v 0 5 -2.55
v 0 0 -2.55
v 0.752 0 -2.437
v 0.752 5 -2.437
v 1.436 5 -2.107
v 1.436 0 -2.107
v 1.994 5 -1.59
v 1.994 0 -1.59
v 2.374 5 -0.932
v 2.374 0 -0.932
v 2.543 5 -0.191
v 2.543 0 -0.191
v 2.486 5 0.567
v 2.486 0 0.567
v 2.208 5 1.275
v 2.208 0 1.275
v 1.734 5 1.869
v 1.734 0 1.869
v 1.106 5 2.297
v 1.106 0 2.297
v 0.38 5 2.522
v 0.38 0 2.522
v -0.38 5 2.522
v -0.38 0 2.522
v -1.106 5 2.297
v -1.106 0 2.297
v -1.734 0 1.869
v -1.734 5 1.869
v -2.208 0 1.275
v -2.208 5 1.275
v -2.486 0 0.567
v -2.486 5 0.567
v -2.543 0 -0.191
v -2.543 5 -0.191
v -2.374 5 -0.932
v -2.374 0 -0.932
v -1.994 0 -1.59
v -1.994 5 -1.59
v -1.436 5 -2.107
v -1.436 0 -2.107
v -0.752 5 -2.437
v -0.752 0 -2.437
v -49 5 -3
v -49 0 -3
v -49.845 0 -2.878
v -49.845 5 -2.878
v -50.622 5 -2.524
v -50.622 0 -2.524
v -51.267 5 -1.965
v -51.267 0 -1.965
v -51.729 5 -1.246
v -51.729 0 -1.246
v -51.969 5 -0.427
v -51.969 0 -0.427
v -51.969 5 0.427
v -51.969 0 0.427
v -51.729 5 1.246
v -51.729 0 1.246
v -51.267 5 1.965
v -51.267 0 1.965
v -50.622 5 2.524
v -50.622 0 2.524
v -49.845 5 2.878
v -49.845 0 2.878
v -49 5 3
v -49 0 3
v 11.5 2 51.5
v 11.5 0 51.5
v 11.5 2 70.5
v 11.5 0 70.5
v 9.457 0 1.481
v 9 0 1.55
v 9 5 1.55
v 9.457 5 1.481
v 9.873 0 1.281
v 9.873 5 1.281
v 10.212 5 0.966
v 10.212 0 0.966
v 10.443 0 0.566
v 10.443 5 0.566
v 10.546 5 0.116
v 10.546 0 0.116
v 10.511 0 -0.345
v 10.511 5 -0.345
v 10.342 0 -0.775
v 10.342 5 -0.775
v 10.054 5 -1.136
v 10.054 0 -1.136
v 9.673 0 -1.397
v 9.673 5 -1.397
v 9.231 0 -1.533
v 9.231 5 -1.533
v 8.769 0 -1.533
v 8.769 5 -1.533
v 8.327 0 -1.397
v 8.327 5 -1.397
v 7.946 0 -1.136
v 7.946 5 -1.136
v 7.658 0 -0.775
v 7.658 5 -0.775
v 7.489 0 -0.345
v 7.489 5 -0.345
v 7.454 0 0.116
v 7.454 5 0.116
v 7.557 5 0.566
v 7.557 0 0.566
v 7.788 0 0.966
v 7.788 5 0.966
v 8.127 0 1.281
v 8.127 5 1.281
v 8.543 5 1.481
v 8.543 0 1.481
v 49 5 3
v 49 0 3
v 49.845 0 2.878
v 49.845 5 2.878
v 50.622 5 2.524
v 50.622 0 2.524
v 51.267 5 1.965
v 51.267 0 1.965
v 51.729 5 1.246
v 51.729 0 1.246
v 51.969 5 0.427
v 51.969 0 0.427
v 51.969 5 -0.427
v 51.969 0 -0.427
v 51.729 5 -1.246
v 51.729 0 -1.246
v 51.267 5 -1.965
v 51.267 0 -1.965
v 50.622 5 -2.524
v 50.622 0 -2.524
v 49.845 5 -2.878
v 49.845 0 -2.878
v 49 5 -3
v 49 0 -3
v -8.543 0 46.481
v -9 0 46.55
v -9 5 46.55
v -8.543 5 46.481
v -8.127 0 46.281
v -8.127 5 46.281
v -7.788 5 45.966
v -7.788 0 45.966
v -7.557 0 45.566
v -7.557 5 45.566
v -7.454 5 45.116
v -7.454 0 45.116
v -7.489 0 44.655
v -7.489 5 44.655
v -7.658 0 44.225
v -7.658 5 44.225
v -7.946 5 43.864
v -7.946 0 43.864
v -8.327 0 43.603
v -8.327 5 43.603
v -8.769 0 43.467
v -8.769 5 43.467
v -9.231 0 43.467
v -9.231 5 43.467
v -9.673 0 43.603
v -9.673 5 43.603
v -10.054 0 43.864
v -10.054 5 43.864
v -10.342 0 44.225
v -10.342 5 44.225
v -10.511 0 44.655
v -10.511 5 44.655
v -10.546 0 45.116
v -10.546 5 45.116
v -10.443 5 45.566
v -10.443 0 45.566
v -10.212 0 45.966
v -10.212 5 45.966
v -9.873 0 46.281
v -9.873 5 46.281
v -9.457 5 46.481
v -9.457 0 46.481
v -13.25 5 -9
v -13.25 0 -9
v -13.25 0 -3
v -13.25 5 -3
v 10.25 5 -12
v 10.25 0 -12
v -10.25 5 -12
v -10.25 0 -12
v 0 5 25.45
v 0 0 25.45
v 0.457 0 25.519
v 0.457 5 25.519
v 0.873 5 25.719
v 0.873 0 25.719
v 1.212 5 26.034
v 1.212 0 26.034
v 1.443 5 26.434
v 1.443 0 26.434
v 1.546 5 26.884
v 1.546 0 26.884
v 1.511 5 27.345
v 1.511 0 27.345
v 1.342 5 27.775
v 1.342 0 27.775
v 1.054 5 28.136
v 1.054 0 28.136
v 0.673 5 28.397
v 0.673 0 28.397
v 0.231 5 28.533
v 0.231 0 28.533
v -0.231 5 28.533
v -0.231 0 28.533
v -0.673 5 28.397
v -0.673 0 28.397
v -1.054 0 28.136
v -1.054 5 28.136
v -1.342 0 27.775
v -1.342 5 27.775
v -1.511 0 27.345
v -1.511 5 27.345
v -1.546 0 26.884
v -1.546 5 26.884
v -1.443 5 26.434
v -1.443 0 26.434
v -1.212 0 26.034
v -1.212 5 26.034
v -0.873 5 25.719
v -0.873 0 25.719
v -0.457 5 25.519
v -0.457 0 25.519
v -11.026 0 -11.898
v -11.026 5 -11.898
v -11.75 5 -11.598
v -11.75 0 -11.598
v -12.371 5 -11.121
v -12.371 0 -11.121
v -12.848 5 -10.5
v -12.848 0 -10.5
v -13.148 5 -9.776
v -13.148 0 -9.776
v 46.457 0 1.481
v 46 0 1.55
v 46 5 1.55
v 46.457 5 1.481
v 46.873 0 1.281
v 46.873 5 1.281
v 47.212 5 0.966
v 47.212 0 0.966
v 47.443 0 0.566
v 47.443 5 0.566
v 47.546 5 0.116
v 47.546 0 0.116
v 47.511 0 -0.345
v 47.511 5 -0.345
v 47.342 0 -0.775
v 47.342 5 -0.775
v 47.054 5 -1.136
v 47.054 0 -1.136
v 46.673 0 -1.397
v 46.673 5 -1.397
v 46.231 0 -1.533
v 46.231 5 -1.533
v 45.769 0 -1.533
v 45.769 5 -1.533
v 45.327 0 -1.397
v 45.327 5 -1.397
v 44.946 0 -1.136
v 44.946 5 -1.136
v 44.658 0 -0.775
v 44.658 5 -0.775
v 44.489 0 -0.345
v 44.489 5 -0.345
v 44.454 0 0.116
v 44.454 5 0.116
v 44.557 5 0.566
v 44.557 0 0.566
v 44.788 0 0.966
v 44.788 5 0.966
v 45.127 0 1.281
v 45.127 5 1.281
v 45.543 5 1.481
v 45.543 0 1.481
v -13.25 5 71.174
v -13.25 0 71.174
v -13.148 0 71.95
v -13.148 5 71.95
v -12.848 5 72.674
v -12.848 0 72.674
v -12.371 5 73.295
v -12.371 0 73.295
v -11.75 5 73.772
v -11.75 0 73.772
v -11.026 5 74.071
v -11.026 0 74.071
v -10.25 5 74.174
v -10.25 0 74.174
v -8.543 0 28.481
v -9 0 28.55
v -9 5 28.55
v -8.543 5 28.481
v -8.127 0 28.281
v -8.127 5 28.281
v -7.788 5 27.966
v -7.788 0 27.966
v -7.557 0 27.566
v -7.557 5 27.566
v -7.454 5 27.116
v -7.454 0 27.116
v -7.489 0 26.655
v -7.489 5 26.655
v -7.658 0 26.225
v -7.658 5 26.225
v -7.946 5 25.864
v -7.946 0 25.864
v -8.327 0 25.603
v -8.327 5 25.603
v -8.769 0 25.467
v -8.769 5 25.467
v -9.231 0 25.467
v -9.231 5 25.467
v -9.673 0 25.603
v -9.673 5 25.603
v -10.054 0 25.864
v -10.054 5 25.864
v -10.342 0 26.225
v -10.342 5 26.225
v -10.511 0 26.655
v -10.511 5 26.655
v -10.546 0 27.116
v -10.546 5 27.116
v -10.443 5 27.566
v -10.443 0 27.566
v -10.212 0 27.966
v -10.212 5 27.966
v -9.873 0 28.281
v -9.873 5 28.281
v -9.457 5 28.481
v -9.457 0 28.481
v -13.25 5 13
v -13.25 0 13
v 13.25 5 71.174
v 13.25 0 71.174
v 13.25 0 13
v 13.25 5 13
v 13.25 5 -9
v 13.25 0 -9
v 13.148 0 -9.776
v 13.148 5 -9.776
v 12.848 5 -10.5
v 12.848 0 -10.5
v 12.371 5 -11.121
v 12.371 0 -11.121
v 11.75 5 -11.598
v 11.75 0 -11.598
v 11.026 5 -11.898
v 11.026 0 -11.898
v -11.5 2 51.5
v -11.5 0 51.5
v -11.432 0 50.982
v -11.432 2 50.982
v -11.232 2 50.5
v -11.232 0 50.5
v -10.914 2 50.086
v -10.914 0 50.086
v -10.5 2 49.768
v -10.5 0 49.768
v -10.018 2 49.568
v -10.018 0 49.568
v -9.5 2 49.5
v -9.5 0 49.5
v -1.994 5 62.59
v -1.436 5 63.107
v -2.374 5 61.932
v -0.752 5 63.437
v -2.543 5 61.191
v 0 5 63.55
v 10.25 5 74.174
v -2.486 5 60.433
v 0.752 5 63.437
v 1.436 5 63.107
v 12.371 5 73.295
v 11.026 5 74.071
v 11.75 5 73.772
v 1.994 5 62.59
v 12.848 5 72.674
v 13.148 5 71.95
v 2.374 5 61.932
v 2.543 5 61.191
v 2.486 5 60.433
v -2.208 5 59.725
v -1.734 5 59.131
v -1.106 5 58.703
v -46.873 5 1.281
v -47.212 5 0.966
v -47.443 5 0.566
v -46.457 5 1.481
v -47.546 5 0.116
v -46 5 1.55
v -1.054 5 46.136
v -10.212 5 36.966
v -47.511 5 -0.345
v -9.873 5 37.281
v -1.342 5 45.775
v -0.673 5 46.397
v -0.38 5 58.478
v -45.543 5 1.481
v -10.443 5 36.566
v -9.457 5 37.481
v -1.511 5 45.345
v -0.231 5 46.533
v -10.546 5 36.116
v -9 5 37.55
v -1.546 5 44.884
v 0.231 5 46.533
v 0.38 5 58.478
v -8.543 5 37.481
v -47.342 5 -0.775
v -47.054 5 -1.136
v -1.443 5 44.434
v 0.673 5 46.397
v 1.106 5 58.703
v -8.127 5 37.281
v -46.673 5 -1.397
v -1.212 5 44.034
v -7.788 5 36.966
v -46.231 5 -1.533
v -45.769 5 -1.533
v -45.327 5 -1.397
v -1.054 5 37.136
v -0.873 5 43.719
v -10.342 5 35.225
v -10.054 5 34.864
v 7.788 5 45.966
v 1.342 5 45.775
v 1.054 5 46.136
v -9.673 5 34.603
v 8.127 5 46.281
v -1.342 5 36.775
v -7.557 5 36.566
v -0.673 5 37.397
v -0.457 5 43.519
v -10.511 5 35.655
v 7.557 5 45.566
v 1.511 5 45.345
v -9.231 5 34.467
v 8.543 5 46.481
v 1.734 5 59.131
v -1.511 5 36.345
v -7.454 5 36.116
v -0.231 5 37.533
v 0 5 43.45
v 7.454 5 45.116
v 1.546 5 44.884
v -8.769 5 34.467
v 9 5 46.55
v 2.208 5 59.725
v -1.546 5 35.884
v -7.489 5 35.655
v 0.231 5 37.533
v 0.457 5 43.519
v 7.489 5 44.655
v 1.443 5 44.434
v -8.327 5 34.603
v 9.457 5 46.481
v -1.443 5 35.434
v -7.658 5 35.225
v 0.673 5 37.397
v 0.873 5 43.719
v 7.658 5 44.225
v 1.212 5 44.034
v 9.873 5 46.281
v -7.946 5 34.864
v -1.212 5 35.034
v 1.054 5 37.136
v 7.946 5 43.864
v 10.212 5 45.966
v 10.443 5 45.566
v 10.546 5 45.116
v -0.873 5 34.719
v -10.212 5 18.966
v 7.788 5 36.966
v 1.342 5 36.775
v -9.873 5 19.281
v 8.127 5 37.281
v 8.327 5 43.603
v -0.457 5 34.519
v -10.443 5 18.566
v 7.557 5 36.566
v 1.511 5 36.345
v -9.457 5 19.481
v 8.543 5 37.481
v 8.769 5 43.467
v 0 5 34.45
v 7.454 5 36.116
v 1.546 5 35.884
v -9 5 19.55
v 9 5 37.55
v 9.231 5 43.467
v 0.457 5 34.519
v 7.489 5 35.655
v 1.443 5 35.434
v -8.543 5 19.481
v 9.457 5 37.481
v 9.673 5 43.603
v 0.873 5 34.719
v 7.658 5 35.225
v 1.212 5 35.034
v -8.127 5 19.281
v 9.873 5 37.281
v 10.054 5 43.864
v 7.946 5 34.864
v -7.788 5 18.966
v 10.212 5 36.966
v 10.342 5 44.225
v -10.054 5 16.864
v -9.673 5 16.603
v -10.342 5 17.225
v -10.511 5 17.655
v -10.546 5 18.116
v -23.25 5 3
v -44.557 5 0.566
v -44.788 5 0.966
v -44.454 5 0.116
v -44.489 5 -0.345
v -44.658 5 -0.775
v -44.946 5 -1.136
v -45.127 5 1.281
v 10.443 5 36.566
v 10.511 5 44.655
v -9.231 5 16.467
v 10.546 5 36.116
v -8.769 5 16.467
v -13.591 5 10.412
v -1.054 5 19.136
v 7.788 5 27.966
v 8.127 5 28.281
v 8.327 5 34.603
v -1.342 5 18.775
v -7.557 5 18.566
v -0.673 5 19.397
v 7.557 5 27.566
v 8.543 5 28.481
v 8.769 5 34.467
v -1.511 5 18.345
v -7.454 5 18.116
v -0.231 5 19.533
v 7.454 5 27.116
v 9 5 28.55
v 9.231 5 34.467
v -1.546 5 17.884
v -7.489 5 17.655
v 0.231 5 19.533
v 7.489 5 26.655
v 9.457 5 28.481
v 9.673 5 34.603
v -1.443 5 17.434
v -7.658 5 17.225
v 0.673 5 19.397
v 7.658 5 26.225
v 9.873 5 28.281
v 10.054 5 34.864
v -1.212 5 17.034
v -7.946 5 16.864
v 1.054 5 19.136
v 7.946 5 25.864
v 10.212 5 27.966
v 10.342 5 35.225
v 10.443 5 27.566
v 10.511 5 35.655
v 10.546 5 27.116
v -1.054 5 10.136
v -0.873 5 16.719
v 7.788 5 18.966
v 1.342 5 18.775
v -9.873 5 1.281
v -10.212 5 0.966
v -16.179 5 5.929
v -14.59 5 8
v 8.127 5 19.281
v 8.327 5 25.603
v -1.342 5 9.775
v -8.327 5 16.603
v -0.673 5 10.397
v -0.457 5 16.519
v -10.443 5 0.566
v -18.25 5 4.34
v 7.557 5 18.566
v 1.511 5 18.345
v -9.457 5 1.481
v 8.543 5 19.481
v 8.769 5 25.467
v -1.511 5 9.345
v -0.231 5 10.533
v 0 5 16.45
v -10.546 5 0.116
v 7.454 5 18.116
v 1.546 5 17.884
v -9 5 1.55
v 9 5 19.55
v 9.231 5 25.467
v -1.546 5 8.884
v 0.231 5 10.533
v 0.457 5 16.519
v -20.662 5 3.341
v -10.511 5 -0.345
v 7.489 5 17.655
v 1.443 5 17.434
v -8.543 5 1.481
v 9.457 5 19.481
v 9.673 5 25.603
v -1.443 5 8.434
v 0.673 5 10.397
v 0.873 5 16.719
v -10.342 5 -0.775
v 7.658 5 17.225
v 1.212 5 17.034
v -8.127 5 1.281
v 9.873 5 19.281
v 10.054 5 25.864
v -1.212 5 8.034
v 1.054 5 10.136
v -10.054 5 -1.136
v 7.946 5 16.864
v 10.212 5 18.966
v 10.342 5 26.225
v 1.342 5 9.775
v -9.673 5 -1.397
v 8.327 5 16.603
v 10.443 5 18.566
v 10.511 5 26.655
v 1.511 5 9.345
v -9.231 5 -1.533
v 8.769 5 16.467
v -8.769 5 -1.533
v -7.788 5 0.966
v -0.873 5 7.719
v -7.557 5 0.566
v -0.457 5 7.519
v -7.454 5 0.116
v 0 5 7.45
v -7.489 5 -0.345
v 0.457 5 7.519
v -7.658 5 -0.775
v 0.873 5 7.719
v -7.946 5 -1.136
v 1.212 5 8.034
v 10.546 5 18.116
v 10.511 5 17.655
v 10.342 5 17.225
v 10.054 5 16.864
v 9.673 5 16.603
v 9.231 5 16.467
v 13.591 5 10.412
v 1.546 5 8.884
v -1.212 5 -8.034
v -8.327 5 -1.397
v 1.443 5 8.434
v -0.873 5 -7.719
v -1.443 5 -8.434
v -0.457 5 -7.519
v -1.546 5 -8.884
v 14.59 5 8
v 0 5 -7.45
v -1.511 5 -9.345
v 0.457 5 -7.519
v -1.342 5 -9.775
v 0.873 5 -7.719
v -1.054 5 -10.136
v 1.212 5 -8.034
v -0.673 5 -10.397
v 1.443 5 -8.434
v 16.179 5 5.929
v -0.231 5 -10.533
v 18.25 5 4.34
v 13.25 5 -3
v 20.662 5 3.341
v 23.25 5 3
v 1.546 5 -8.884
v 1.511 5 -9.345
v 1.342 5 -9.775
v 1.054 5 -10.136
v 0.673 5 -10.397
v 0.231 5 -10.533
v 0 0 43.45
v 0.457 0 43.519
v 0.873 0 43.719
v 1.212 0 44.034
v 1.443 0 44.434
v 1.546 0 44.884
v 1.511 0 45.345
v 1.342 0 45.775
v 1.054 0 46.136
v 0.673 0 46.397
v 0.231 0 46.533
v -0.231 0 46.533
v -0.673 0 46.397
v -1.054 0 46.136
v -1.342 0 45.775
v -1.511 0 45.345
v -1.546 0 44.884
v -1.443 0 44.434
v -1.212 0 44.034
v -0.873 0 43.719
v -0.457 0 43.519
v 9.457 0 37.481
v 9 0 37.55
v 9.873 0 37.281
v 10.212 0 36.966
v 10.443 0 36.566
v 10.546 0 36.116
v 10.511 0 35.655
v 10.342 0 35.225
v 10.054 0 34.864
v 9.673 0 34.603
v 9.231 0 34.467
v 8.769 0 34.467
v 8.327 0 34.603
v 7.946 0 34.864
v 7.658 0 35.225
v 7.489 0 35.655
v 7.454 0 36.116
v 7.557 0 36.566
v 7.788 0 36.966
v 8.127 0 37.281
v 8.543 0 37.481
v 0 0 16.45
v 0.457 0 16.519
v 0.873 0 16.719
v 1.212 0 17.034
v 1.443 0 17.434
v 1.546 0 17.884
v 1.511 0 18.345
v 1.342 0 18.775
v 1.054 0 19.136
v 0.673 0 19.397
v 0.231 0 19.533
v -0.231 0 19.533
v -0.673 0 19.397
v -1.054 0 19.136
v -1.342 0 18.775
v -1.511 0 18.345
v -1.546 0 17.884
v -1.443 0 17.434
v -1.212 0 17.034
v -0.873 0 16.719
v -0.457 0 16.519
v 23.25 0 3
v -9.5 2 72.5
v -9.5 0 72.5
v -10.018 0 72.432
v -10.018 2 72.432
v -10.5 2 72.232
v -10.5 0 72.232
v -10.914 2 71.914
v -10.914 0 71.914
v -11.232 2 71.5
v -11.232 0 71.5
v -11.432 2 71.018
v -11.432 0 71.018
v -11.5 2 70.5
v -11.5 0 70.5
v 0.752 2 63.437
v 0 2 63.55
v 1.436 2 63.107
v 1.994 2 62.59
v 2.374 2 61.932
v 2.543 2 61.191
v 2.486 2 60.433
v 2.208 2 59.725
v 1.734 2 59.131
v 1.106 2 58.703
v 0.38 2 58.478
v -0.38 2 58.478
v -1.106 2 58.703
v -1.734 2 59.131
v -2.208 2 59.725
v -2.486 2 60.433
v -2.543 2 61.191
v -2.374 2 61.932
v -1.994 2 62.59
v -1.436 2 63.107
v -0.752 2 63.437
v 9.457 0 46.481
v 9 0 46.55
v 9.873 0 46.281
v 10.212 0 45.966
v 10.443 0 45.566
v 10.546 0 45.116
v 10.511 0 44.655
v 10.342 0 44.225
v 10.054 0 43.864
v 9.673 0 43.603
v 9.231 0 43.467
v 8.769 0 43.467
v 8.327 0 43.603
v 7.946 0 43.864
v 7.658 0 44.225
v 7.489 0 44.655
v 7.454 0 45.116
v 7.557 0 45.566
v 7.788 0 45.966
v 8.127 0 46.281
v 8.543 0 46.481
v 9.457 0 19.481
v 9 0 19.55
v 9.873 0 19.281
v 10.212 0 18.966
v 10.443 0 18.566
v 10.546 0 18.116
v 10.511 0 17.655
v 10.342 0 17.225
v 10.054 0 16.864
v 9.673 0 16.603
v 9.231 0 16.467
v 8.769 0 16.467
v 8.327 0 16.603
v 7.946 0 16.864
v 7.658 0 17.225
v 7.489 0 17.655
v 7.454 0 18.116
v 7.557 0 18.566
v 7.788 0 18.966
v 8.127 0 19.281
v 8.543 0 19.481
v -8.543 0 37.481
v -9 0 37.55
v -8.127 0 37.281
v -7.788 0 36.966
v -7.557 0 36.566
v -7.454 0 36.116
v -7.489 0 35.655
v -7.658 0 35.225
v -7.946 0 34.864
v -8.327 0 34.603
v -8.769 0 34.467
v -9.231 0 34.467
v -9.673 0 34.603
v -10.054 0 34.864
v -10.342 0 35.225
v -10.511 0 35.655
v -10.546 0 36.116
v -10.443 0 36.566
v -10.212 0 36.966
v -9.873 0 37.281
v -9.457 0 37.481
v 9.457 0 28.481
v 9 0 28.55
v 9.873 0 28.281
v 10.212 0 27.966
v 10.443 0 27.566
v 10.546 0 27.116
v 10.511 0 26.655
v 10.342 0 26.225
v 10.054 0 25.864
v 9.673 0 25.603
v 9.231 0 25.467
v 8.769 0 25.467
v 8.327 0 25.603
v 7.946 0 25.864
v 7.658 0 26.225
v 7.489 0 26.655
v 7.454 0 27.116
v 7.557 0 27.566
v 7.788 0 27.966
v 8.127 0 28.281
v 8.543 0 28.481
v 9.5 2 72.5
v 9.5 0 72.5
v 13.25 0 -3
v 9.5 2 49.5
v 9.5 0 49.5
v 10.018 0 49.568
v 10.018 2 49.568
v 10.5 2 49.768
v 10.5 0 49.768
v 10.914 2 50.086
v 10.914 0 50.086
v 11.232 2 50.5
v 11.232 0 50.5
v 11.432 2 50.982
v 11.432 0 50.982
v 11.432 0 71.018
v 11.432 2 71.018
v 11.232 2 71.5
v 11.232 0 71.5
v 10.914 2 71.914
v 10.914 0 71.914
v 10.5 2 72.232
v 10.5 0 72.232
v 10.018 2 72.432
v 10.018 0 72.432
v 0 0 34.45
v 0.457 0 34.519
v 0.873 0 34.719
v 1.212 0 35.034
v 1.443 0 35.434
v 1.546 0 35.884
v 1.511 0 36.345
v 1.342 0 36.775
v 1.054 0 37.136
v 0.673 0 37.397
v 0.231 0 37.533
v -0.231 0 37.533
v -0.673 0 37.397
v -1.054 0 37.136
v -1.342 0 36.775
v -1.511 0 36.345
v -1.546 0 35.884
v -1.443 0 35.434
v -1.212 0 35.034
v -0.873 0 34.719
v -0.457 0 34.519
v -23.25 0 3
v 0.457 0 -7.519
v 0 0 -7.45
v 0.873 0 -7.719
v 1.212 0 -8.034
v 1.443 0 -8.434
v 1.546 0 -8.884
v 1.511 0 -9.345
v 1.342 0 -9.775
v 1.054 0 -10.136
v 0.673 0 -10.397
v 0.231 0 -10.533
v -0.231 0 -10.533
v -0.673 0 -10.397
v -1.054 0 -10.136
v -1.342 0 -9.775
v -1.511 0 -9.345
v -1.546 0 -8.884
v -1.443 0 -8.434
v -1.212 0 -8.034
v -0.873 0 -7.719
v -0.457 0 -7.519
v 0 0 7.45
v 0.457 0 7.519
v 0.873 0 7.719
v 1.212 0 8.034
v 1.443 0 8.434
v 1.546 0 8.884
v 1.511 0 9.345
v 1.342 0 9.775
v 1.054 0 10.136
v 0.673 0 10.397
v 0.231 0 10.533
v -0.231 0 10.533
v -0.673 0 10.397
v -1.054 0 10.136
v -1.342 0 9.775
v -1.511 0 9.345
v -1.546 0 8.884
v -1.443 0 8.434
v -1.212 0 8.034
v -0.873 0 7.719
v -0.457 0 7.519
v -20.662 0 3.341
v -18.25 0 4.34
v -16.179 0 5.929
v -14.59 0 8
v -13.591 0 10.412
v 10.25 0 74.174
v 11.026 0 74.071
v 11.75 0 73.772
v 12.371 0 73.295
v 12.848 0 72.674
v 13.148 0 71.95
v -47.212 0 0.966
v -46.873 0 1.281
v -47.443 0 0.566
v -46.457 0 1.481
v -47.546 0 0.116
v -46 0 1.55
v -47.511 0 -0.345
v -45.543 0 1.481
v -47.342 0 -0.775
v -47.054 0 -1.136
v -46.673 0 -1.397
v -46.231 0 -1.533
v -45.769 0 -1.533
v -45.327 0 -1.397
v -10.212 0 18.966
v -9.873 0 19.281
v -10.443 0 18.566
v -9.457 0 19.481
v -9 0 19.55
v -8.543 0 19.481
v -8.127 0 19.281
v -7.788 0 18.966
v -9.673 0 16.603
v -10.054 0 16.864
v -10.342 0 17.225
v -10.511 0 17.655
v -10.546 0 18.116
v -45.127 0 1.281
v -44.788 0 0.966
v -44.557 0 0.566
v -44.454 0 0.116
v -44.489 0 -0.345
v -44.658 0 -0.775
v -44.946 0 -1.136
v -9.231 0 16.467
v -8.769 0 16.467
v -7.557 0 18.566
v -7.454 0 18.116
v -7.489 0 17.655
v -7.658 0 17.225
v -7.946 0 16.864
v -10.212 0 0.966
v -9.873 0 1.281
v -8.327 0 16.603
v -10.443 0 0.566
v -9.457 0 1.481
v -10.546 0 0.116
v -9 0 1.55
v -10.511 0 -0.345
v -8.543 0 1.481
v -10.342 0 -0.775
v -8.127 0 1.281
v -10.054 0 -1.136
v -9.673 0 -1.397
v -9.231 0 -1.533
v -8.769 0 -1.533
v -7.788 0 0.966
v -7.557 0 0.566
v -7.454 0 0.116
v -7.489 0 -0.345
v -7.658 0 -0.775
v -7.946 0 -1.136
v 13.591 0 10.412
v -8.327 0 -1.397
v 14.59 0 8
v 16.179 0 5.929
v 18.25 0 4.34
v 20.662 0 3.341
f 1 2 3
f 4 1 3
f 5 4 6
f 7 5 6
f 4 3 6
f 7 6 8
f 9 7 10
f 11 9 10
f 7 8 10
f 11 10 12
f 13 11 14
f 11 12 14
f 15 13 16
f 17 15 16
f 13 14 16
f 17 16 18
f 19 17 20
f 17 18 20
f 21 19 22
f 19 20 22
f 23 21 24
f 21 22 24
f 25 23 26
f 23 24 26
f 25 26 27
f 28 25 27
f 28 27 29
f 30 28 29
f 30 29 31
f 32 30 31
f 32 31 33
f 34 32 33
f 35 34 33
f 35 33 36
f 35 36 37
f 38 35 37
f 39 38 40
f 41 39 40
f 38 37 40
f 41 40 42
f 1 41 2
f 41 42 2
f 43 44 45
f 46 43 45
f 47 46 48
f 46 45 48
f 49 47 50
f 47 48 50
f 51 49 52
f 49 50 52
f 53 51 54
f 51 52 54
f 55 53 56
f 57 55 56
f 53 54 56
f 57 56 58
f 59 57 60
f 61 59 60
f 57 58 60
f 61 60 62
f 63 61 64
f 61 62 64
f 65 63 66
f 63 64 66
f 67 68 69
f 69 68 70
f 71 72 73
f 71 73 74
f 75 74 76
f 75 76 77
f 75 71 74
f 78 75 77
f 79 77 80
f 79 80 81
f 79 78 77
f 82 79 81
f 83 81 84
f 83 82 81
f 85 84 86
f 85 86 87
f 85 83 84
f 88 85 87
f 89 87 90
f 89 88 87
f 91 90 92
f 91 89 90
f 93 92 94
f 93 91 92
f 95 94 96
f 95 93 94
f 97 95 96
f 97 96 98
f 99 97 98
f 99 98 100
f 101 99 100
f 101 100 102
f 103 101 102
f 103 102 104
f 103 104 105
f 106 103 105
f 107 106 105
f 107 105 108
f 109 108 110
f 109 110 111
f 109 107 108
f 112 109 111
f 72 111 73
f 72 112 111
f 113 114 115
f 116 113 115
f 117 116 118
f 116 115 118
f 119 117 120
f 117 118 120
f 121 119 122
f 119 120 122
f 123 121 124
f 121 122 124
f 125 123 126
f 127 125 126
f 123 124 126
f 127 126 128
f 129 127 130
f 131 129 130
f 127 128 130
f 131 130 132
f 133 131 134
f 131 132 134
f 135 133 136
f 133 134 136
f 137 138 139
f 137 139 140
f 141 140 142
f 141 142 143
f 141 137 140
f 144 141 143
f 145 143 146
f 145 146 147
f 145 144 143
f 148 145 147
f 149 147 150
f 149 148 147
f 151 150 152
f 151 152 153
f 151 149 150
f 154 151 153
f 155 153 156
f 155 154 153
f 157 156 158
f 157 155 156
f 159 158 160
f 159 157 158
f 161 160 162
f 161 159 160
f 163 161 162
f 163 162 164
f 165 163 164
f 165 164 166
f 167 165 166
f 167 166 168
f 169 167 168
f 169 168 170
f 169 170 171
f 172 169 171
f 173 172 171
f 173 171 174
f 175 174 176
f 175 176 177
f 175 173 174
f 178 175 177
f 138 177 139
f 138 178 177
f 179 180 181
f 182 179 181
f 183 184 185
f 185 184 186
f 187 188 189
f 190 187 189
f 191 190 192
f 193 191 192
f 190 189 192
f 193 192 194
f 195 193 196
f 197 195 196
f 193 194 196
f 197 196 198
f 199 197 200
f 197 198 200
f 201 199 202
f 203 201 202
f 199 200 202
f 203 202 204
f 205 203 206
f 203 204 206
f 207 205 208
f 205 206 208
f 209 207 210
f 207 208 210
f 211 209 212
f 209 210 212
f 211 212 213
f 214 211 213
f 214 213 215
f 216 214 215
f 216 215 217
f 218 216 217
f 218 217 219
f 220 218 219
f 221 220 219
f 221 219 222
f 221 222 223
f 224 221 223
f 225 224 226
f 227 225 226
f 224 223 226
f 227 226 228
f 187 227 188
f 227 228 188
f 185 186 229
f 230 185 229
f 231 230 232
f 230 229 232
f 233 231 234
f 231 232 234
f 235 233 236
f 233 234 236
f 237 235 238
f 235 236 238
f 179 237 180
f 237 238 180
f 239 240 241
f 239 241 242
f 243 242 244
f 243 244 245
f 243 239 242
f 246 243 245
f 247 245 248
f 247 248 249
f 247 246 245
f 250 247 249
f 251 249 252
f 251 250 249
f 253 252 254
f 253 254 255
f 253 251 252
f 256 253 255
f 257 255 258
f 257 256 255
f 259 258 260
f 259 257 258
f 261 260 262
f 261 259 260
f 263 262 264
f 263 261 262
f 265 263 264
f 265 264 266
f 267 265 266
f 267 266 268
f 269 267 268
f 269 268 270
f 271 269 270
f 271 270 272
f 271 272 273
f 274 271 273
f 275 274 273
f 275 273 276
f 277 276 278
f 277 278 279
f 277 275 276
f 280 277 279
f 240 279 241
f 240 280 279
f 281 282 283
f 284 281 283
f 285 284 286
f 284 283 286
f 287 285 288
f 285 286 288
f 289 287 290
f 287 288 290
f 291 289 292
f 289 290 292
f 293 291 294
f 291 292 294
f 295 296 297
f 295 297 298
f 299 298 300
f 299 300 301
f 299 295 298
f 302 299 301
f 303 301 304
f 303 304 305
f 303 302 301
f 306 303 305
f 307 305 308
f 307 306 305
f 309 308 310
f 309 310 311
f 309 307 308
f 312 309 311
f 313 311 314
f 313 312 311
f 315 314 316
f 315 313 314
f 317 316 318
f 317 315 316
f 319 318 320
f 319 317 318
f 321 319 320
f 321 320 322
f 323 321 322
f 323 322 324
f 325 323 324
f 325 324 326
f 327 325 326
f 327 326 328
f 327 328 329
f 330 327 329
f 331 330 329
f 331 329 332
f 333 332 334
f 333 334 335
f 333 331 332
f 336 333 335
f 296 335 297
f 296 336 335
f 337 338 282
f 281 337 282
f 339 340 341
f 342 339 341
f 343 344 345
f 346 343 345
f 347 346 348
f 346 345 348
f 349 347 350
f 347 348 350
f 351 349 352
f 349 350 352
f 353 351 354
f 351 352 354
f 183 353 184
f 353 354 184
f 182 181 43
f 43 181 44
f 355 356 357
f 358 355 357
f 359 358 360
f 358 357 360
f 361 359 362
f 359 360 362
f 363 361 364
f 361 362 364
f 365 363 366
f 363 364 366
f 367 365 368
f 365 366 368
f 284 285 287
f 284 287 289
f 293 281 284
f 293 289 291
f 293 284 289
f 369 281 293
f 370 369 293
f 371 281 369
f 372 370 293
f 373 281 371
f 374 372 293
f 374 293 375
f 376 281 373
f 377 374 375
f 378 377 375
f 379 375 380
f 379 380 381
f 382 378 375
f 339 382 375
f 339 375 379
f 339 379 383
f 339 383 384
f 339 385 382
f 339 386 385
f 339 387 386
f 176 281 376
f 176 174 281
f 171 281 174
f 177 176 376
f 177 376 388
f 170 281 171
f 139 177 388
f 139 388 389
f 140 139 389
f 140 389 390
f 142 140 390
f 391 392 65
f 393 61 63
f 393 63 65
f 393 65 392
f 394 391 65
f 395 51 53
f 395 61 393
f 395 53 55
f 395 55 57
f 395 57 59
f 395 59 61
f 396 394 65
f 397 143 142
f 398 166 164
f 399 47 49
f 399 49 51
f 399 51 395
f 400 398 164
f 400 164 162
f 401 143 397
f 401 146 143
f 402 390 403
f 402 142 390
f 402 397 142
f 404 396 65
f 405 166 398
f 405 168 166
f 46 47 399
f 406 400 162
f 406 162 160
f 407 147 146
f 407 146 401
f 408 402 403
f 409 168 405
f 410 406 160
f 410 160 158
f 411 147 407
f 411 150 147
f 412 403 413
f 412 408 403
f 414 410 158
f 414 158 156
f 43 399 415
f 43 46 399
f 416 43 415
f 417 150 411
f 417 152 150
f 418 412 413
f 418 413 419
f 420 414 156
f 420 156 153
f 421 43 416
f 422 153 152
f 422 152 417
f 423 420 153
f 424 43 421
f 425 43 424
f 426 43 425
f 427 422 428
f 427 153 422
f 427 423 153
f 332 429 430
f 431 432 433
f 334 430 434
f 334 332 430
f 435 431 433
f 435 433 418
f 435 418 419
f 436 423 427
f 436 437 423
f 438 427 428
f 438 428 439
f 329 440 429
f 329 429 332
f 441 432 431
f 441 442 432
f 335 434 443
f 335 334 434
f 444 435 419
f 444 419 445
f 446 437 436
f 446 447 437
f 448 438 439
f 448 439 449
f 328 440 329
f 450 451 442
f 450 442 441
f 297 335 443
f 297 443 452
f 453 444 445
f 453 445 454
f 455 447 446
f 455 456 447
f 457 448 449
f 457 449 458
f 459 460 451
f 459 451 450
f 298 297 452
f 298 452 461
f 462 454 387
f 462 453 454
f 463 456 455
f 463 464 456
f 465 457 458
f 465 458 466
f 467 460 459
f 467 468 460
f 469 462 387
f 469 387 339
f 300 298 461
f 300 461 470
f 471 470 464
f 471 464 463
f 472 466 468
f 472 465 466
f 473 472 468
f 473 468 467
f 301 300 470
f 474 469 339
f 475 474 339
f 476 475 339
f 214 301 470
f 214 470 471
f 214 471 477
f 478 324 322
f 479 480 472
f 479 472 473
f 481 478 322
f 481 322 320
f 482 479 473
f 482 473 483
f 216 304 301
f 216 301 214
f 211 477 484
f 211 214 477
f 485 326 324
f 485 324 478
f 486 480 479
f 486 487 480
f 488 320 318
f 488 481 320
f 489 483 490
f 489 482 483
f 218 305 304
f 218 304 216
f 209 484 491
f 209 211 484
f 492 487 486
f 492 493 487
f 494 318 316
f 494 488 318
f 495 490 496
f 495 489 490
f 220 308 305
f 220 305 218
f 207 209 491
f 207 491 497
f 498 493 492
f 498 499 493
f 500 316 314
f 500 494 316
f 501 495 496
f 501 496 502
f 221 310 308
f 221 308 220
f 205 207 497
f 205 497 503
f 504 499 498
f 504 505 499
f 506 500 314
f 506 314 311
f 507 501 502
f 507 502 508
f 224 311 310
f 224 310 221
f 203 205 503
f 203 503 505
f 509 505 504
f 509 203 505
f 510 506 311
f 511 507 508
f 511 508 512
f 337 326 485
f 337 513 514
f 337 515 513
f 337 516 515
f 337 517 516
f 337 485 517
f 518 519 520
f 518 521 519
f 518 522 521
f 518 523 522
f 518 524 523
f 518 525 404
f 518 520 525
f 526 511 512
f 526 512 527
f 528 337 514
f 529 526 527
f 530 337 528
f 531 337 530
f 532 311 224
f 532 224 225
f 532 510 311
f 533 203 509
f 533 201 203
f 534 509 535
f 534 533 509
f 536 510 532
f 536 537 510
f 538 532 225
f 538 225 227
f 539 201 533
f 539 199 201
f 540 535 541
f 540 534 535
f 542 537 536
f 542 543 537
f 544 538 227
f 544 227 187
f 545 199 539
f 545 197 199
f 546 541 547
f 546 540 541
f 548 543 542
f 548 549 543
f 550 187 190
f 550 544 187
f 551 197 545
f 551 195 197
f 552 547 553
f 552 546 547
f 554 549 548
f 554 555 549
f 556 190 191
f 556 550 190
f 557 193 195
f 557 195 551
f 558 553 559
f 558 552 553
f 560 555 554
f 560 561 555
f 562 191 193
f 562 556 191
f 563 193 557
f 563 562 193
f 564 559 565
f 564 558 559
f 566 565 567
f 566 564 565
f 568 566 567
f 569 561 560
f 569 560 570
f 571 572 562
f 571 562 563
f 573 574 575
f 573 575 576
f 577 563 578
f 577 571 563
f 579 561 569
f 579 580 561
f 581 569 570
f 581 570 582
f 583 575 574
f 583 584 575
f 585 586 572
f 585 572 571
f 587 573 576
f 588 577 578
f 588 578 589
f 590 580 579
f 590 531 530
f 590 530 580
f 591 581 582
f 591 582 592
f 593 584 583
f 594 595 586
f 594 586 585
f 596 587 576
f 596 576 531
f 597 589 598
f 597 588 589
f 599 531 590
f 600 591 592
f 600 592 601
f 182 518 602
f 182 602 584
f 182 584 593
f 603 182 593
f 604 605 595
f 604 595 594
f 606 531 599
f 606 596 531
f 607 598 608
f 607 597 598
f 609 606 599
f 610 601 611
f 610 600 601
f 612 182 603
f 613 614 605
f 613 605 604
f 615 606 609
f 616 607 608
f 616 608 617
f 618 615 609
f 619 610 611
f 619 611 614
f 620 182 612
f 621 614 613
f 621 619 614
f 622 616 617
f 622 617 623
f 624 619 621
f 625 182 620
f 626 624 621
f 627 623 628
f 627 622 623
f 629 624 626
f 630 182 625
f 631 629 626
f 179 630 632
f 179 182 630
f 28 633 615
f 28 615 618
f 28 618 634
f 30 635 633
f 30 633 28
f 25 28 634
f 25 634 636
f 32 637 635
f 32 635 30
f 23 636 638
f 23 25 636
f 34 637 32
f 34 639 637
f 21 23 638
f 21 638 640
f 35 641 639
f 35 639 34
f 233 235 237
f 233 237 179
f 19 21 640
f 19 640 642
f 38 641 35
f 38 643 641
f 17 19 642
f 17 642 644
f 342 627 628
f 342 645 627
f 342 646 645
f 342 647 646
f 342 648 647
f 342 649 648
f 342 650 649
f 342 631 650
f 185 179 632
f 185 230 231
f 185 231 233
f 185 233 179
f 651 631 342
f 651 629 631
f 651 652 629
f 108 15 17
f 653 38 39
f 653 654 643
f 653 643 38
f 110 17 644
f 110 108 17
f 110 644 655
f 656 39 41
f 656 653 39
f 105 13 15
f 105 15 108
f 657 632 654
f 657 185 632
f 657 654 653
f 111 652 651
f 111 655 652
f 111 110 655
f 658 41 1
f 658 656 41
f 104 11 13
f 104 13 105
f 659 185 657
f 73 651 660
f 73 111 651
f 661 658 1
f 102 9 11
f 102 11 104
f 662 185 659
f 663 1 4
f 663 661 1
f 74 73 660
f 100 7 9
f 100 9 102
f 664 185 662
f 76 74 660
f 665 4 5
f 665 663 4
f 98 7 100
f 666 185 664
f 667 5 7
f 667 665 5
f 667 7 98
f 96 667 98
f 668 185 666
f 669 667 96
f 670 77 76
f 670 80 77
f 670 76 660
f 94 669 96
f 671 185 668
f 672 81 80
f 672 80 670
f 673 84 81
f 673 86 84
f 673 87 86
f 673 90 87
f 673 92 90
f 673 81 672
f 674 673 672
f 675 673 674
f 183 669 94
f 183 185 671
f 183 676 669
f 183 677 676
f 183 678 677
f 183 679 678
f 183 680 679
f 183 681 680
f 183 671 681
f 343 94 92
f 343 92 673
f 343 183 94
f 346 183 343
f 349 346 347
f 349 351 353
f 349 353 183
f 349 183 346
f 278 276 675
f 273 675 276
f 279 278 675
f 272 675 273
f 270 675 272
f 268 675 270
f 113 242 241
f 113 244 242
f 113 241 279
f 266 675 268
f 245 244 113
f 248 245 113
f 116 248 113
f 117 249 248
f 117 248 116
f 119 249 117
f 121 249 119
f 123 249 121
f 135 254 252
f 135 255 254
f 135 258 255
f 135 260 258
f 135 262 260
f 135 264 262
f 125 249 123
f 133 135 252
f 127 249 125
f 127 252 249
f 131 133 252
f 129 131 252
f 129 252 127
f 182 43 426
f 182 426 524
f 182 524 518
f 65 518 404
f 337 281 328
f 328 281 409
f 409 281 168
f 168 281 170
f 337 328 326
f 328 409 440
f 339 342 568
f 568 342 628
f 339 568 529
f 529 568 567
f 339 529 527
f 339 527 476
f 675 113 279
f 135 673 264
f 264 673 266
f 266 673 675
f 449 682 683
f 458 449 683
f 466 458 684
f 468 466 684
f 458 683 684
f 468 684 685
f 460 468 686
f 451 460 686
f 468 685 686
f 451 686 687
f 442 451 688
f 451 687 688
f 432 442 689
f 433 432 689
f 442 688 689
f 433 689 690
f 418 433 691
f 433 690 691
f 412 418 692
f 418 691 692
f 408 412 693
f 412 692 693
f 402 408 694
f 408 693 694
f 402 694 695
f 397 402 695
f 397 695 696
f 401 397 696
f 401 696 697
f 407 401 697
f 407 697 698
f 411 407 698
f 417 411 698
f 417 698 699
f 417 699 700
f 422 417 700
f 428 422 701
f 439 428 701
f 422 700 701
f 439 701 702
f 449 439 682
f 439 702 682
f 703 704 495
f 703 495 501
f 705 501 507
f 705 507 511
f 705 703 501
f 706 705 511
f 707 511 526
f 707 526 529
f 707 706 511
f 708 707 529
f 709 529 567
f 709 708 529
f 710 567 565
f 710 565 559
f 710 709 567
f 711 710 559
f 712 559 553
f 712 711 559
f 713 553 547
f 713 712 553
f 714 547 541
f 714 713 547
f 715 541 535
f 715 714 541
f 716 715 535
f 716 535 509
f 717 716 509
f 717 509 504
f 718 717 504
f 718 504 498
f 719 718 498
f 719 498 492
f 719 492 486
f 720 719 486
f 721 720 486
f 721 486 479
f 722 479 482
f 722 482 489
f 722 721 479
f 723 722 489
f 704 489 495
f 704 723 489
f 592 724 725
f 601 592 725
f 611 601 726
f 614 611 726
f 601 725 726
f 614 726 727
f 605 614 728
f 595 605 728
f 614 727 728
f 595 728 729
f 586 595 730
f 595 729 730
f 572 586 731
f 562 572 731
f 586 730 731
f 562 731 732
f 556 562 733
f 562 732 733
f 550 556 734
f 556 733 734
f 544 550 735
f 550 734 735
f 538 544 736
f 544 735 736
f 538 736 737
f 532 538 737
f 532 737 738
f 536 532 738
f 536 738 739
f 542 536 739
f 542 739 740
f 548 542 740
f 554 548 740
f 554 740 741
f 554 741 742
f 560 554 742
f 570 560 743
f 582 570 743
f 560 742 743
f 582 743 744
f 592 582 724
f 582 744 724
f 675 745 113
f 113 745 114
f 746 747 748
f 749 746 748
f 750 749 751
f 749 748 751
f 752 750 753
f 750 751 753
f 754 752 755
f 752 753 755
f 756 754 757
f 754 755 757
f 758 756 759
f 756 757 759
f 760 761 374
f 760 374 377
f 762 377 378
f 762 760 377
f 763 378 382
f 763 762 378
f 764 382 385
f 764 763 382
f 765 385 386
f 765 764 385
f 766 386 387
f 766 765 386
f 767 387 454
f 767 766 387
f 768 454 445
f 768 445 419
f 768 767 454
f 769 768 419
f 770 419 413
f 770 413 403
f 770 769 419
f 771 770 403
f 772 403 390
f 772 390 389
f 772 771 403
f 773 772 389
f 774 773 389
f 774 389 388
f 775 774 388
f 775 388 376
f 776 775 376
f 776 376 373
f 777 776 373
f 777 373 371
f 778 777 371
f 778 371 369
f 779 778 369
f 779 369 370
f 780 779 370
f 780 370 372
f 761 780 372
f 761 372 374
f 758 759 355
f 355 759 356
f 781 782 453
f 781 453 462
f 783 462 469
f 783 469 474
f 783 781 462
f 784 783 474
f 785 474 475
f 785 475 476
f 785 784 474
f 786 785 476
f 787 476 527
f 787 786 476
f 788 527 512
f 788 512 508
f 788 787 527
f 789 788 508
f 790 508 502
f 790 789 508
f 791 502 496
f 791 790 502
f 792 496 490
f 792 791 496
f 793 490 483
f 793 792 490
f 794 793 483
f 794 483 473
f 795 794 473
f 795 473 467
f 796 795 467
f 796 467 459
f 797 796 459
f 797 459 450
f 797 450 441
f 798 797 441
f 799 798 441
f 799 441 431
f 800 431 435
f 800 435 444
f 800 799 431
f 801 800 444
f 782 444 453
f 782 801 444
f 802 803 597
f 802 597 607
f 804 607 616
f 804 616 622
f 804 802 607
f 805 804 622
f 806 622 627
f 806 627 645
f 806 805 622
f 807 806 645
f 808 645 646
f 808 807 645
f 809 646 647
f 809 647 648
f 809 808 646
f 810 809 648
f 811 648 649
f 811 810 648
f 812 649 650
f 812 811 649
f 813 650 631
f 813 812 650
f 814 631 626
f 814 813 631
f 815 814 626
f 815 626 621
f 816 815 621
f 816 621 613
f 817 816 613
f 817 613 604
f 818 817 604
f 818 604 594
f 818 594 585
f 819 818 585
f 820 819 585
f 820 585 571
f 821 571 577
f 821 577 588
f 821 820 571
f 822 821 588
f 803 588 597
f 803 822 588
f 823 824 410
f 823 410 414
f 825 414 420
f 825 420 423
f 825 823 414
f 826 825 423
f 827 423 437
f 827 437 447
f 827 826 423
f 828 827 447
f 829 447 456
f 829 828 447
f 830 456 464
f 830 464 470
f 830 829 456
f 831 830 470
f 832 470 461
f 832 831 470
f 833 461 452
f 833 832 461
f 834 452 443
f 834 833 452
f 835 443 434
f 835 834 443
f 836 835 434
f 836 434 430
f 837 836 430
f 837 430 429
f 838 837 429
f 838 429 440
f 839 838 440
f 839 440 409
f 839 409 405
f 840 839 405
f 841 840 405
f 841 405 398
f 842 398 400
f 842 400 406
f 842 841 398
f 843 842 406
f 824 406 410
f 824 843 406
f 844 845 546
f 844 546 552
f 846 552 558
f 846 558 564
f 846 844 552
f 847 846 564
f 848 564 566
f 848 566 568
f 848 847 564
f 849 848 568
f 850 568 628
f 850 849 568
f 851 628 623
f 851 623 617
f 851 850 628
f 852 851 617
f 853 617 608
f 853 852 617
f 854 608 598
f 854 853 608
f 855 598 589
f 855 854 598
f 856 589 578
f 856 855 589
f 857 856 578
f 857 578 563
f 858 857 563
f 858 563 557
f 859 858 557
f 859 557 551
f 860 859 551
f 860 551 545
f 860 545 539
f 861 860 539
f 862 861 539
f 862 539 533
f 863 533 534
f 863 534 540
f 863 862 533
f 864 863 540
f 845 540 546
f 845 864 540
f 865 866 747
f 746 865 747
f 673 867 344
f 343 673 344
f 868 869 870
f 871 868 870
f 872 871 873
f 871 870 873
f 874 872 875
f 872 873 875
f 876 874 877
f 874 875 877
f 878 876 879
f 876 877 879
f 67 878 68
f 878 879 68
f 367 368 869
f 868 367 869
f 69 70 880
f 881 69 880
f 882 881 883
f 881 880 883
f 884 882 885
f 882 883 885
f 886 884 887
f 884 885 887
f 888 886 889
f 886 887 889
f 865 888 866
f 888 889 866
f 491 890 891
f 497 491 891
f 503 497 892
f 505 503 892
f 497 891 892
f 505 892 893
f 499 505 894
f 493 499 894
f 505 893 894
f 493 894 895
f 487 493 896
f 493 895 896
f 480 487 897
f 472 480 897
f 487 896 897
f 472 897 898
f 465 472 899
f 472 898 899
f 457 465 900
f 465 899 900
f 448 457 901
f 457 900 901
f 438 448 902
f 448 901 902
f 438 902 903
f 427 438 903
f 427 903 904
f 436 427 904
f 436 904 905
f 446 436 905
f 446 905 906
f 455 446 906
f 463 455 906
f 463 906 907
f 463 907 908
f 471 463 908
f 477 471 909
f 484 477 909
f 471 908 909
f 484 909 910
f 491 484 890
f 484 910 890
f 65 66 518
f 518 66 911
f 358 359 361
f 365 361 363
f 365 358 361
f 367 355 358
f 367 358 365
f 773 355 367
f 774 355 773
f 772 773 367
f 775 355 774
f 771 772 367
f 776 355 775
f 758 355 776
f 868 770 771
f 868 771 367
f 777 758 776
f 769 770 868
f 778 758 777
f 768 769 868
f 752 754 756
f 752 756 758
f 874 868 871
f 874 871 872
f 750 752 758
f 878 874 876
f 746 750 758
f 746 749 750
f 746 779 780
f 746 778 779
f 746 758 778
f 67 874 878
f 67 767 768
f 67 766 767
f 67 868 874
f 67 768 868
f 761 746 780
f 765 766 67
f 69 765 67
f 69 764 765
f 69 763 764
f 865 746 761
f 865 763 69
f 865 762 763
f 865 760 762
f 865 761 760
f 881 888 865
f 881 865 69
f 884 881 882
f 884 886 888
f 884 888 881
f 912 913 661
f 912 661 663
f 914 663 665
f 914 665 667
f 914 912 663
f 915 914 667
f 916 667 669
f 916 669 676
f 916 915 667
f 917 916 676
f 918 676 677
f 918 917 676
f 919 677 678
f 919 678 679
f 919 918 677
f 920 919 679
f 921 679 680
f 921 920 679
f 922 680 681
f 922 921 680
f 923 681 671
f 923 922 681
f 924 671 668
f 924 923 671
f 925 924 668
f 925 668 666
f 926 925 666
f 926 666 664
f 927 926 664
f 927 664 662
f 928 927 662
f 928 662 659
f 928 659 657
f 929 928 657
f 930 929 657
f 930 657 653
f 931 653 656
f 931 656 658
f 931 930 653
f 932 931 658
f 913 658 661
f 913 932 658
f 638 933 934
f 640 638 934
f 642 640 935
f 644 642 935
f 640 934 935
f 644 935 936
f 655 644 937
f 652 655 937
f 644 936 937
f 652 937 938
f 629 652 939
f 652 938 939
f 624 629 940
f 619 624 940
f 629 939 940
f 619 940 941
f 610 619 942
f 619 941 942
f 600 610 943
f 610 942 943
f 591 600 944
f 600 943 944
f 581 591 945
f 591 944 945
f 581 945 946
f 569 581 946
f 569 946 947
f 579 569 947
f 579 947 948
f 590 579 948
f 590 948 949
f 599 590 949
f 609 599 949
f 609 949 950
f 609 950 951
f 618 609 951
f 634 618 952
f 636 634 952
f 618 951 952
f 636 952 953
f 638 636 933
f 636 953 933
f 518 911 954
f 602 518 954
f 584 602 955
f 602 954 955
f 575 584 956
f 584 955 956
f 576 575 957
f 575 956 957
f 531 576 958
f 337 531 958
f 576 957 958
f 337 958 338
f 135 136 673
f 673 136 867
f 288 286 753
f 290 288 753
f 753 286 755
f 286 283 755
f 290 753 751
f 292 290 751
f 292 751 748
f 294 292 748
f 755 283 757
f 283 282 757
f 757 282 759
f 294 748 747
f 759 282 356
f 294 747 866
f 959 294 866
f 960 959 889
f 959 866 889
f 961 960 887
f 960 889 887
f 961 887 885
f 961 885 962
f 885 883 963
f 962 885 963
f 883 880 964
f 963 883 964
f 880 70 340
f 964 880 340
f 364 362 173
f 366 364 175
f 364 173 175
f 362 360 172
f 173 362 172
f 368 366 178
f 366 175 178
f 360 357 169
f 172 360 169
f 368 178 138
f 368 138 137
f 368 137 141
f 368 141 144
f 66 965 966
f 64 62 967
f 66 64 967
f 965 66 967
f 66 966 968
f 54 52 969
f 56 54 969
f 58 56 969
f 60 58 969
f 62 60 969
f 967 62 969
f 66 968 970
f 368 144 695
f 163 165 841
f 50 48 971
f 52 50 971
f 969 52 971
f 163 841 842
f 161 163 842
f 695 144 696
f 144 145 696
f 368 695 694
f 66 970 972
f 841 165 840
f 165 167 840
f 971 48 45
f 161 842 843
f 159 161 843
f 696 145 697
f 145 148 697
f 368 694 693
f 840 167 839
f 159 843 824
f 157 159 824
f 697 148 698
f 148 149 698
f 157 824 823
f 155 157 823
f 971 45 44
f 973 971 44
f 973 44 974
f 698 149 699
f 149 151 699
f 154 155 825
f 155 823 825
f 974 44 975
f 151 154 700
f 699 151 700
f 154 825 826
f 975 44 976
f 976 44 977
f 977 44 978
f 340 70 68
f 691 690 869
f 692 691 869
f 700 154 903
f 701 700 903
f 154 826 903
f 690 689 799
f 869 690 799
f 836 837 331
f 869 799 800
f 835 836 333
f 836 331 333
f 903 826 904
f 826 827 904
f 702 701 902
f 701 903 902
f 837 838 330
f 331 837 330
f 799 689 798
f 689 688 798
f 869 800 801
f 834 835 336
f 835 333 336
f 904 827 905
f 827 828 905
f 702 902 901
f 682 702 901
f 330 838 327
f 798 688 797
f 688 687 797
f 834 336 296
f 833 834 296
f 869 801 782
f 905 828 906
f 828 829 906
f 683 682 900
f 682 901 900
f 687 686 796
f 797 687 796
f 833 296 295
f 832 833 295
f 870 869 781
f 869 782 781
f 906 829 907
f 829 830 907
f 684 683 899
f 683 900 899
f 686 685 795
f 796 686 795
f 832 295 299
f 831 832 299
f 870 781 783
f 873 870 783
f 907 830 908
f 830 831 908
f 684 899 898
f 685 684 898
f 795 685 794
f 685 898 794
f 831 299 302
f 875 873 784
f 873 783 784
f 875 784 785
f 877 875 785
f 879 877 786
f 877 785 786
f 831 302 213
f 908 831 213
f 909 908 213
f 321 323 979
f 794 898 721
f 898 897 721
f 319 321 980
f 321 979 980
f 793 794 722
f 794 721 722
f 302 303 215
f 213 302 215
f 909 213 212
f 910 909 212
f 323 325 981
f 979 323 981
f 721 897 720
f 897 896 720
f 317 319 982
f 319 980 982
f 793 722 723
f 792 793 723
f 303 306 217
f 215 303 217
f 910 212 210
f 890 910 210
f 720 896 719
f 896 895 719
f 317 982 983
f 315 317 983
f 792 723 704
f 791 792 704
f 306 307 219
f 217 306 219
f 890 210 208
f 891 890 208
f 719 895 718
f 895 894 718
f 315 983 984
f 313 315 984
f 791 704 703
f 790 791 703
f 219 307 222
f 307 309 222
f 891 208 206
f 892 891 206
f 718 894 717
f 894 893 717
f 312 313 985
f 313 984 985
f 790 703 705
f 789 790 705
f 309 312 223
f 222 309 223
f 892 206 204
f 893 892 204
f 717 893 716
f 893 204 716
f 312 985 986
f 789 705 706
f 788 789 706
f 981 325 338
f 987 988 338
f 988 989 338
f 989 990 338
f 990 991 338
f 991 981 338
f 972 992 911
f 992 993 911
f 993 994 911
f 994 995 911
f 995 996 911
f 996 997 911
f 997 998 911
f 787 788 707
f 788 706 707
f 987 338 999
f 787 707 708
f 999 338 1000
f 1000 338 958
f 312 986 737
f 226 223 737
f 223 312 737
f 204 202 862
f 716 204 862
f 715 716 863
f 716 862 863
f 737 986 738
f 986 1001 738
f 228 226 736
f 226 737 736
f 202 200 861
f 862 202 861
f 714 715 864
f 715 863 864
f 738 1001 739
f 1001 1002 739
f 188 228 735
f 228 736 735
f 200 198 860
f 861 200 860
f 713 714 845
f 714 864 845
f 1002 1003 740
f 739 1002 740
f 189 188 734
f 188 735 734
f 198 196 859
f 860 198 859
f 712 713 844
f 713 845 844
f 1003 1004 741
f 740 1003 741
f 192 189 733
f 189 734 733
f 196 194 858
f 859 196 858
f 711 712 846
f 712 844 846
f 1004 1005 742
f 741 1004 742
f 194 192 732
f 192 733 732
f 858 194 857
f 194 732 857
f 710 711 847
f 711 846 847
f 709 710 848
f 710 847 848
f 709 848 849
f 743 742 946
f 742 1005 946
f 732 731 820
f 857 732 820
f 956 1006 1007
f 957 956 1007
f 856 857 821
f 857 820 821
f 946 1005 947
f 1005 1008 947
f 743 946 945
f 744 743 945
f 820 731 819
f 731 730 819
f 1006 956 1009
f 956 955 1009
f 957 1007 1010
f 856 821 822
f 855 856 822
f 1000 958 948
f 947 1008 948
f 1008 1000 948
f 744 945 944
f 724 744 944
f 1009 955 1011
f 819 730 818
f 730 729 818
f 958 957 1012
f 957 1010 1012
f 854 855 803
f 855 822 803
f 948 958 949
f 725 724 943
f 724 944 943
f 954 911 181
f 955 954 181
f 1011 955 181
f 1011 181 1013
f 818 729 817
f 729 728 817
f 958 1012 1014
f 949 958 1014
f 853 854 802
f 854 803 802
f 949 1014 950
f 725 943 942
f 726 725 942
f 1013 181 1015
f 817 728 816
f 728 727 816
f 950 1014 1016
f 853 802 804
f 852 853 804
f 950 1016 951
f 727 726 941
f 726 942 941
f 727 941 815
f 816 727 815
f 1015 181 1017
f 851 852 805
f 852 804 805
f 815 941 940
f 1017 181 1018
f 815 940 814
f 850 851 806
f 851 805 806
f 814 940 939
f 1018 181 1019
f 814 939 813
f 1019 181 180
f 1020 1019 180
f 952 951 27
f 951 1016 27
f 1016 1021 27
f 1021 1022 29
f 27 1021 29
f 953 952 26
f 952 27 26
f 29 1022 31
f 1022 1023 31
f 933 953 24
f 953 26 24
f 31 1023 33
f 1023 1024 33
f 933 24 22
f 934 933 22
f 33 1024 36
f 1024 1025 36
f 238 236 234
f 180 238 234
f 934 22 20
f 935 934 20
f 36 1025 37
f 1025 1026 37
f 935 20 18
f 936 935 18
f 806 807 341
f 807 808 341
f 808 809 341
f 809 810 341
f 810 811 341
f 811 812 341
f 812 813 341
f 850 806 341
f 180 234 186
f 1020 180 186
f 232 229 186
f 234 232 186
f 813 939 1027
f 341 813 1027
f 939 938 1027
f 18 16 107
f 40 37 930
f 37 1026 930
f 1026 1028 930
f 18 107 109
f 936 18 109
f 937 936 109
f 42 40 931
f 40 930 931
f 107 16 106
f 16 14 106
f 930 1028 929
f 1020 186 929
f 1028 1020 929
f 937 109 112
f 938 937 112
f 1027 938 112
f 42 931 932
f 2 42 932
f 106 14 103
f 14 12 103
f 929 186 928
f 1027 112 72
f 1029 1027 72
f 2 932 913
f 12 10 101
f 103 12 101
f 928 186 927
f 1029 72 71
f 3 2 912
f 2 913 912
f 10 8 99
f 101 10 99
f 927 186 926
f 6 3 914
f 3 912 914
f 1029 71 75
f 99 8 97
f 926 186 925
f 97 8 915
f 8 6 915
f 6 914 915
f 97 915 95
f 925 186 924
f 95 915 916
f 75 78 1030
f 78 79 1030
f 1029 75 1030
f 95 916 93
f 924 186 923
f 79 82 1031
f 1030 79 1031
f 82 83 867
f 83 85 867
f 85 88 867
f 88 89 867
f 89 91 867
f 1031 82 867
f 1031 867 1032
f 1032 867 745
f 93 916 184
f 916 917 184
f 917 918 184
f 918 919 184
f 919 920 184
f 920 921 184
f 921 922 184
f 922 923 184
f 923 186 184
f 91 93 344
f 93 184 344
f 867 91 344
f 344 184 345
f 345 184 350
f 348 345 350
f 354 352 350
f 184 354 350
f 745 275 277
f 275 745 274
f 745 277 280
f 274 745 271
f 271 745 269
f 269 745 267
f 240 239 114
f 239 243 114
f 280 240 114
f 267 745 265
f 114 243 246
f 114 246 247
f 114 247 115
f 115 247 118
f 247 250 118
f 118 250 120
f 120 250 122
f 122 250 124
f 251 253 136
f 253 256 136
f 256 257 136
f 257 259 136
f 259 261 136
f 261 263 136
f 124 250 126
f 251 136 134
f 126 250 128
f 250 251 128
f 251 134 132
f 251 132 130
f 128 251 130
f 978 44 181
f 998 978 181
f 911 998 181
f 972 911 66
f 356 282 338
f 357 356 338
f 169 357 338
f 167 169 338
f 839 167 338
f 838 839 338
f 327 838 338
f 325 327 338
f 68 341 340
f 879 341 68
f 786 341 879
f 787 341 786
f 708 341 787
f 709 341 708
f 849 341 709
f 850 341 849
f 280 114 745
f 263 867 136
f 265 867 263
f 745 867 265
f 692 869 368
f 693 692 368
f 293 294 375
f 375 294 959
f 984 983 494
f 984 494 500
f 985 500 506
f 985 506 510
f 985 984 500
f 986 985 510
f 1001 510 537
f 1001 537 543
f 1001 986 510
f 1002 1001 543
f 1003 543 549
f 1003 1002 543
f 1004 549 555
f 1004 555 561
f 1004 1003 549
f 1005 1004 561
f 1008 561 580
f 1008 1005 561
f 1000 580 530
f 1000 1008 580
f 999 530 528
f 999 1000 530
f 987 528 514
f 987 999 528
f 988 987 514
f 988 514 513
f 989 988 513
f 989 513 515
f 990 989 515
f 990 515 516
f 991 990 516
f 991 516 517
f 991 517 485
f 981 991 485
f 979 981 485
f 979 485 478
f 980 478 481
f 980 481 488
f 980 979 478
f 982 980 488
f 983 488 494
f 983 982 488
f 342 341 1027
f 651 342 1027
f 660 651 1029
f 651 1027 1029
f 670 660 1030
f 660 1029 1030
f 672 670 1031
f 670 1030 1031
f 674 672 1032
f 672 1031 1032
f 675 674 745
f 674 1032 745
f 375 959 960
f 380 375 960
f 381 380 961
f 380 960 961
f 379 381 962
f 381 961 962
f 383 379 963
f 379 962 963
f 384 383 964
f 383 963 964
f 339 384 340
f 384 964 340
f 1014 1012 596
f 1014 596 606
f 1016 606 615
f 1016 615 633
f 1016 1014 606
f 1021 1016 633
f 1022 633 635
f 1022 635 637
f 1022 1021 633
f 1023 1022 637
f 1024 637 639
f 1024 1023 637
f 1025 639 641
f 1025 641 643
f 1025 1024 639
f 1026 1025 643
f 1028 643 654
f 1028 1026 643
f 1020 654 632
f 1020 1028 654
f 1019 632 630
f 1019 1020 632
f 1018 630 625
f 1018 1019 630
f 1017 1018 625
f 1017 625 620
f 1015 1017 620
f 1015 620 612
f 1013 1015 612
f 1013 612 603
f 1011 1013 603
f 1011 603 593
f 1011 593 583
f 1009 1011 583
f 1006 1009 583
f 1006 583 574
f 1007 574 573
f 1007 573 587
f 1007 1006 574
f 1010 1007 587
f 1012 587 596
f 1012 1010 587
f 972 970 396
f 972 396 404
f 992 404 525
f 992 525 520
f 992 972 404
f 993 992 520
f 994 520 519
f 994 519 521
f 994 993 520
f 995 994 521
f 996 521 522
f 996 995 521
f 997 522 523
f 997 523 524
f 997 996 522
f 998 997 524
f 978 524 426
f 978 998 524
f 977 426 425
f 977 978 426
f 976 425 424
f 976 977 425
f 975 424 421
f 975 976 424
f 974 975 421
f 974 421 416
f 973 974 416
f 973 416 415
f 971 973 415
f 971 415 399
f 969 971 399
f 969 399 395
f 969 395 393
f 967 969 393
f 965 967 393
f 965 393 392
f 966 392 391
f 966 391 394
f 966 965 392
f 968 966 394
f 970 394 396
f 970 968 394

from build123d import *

# Parameters (mm, degrees)
SKETCH1_R           = 1.55
SKETCH1_R_2         = 2.55
BOSS_EXTRUDE1_DEPTH = 5
CUT_EXTRUDE1_DEPTH  = 2


with BuildPart() as part:
    # Sketch1 → Boss-Extrude1 (new body)
    with BuildSketch(Plane(origin=(0, 0, 0), x_dir=(1, 0, 0), z_dir=(0, 1, 0))):
        with BuildLine():
            Line((-13.25, 3), (-49, 3))
            ThreePointArc((-49, 3), (-52, 0), (-49, -3))
            Line((-49, -3), (-23.25, -3))
            ThreePointArc((-23.25, -3), (-16.178932188, -5.928932188), (-13.25, -13))
            Line((-13.25, -13), (-13.25, -71.173549983))
            ThreePointArc((-13.25, -71.173549983), (-12.371320344, -73.294870327), (-10.25, -74.173549983))
            Line((-10.25, -74.173549983), (10.25, -74.173549983))
            ThreePointArc((10.25, -74.173549983), (12.371320344, -73.294870327), (13.25, -71.173549983))
            Line((13.25, -71.173549983), (13.25, -13))
            ThreePointArc((13.25, -13), (16.178932188, -5.928932188), (23.25, -3))
            Line((23.25, -3), (49, -3))
            ThreePointArc((49, -3), (52, 0), (49, 3))
            Line((49, 3), (13.25, 3))
            Line((13.25, 3), (13.25, 9))
            ThreePointArc((13.25, 9), (12.371320344, 11.121320344), (10.25, 12))
            Line((10.25, 12), (-10.25, 12))
            ThreePointArc((-10.25, 12), (-12.371320344, 11.121320344), (-13.25, 9))
            Line((-13.25, 9), (-13.25, 3))
        make_face()
        with Locations(Location((-9, -45, 0), (0, 0, 270))):
            Circle(SKETCH1_R, mode=Mode.SUBTRACT)
        with Locations(Location((-9, -36, 0), (0, 0, 270))):
            Circle(SKETCH1_R, mode=Mode.SUBTRACT)
        with BuildLine():
            ThreePointArc((0, -46.55), (-1.55, -45), (0, -43.45))
            ThreePointArc((0, -43.45), (1.55, -45), (0, -46.55))
        make_face(mode=Mode.SUBTRACT)
        with Locations(Location((9, -45, 0), (0, 0, 270))):
            Circle(SKETCH1_R, mode=Mode.SUBTRACT)
        with BuildLine():
            ThreePointArc((0, -37.55), (-1.55, -36), (0, -34.45))
            ThreePointArc((0, -34.45), (1.55, -36), (0, -37.55))
        make_face(mode=Mode.SUBTRACT)
        with Locations(Location((9, -36, 0), (0, 0, 270))):
            Circle(SKETCH1_R, mode=Mode.SUBTRACT)
        with Locations(Location((-9, -27, 0), (0, 0, 270))):
            Circle(SKETCH1_R, mode=Mode.SUBTRACT)
        with Locations(Location((-9, -18, 0), (0, 0, 270))):
            Circle(SKETCH1_R, mode=Mode.SUBTRACT)
        with Locations(Location((-46, 0, 0), (0, 0, 270))):
            Circle(SKETCH1_R, mode=Mode.SUBTRACT)
        with BuildLine():
            ThreePointArc((0, -10.55), (-1.55, -9), (0, -7.45))
            ThreePointArc((0, -7.45), (1.55, -9), (0, -10.55))
        make_face(mode=Mode.SUBTRACT)
        with Locations(Location((-9, 0, 0), (0, 0, 270))):
            Circle(SKETCH1_R, mode=Mode.SUBTRACT)
        with BuildLine():
            ThreePointArc((0, -28.55), (-1.55, -27), (0, -25.45))
            ThreePointArc((0, -25.45), (1.55, -27), (0, -28.55))
        make_face(mode=Mode.SUBTRACT)
        with Locations(Location((9, -27, 0), (0, 0, 270))):
            Circle(SKETCH1_R, mode=Mode.SUBTRACT)
        with BuildLine():
            ThreePointArc((0, -19.55), (-1.55, -18), (0, -16.45))
            ThreePointArc((0, -16.45), (1.55, -18), (0, -19.55))
        make_face(mode=Mode.SUBTRACT)
        with Locations(Location((9, -18, 0), (0, 0, 270))):
            Circle(SKETCH1_R, mode=Mode.SUBTRACT)
        with BuildLine():
            ThreePointArc((0, -2.55), (-2.55, 0), (0, 2.55))
            ThreePointArc((0, 2.55), (2.55, 0), (0, -2.55))
        make_face(mode=Mode.SUBTRACT)
        with Locations(Location((9, 0, 0), (0, 0, 270))):
            Circle(SKETCH1_R, mode=Mode.SUBTRACT)
        with Locations(Location((0, 9, 0), (0, 0, 270))):
            Circle(SKETCH1_R, mode=Mode.SUBTRACT)
        with Locations(Location((46, 0, 0), (0, 0, 270))):
            Circle(SKETCH1_R, mode=Mode.SUBTRACT)
        with Locations(Location((0, -61, 0), (0, 0, 270))):
            Circle(SKETCH1_R_2, mode=Mode.SUBTRACT)
    extrude(amount=BOSS_EXTRUDE1_DEPTH)

    # Sketch2 → Cut-Extrude1 (cut)
    with BuildSketch(Plane.XZ):
        with BuildLine():
            Line((-11.5, 70.5), (-11.5, 51.5))
            ThreePointArc((-11.5, 51.5), (-10.914213562, 50.085786438), (-9.5, 49.5))
            Line((-9.5, 49.5), (9.5, 49.5))
            ThreePointArc((9.5, 49.5), (10.914213562, 50.085786438), (11.5, 51.5))
            Line((11.5, 51.5), (11.5, 70.5))
            ThreePointArc((11.5, 70.5), (10.914213562, 71.914213562), (9.5, 72.5))
            Line((9.5, 72.5), (-9.5, 72.5))
            ThreePointArc((-9.5, 72.5), (-10.914213562, 71.914213562), (-11.5, 70.5))
        make_face()
    extrude(amount=-CUT_EXTRUDE1_DEPTH, mode=Mode.SUBTRACT)


solid = part.part
